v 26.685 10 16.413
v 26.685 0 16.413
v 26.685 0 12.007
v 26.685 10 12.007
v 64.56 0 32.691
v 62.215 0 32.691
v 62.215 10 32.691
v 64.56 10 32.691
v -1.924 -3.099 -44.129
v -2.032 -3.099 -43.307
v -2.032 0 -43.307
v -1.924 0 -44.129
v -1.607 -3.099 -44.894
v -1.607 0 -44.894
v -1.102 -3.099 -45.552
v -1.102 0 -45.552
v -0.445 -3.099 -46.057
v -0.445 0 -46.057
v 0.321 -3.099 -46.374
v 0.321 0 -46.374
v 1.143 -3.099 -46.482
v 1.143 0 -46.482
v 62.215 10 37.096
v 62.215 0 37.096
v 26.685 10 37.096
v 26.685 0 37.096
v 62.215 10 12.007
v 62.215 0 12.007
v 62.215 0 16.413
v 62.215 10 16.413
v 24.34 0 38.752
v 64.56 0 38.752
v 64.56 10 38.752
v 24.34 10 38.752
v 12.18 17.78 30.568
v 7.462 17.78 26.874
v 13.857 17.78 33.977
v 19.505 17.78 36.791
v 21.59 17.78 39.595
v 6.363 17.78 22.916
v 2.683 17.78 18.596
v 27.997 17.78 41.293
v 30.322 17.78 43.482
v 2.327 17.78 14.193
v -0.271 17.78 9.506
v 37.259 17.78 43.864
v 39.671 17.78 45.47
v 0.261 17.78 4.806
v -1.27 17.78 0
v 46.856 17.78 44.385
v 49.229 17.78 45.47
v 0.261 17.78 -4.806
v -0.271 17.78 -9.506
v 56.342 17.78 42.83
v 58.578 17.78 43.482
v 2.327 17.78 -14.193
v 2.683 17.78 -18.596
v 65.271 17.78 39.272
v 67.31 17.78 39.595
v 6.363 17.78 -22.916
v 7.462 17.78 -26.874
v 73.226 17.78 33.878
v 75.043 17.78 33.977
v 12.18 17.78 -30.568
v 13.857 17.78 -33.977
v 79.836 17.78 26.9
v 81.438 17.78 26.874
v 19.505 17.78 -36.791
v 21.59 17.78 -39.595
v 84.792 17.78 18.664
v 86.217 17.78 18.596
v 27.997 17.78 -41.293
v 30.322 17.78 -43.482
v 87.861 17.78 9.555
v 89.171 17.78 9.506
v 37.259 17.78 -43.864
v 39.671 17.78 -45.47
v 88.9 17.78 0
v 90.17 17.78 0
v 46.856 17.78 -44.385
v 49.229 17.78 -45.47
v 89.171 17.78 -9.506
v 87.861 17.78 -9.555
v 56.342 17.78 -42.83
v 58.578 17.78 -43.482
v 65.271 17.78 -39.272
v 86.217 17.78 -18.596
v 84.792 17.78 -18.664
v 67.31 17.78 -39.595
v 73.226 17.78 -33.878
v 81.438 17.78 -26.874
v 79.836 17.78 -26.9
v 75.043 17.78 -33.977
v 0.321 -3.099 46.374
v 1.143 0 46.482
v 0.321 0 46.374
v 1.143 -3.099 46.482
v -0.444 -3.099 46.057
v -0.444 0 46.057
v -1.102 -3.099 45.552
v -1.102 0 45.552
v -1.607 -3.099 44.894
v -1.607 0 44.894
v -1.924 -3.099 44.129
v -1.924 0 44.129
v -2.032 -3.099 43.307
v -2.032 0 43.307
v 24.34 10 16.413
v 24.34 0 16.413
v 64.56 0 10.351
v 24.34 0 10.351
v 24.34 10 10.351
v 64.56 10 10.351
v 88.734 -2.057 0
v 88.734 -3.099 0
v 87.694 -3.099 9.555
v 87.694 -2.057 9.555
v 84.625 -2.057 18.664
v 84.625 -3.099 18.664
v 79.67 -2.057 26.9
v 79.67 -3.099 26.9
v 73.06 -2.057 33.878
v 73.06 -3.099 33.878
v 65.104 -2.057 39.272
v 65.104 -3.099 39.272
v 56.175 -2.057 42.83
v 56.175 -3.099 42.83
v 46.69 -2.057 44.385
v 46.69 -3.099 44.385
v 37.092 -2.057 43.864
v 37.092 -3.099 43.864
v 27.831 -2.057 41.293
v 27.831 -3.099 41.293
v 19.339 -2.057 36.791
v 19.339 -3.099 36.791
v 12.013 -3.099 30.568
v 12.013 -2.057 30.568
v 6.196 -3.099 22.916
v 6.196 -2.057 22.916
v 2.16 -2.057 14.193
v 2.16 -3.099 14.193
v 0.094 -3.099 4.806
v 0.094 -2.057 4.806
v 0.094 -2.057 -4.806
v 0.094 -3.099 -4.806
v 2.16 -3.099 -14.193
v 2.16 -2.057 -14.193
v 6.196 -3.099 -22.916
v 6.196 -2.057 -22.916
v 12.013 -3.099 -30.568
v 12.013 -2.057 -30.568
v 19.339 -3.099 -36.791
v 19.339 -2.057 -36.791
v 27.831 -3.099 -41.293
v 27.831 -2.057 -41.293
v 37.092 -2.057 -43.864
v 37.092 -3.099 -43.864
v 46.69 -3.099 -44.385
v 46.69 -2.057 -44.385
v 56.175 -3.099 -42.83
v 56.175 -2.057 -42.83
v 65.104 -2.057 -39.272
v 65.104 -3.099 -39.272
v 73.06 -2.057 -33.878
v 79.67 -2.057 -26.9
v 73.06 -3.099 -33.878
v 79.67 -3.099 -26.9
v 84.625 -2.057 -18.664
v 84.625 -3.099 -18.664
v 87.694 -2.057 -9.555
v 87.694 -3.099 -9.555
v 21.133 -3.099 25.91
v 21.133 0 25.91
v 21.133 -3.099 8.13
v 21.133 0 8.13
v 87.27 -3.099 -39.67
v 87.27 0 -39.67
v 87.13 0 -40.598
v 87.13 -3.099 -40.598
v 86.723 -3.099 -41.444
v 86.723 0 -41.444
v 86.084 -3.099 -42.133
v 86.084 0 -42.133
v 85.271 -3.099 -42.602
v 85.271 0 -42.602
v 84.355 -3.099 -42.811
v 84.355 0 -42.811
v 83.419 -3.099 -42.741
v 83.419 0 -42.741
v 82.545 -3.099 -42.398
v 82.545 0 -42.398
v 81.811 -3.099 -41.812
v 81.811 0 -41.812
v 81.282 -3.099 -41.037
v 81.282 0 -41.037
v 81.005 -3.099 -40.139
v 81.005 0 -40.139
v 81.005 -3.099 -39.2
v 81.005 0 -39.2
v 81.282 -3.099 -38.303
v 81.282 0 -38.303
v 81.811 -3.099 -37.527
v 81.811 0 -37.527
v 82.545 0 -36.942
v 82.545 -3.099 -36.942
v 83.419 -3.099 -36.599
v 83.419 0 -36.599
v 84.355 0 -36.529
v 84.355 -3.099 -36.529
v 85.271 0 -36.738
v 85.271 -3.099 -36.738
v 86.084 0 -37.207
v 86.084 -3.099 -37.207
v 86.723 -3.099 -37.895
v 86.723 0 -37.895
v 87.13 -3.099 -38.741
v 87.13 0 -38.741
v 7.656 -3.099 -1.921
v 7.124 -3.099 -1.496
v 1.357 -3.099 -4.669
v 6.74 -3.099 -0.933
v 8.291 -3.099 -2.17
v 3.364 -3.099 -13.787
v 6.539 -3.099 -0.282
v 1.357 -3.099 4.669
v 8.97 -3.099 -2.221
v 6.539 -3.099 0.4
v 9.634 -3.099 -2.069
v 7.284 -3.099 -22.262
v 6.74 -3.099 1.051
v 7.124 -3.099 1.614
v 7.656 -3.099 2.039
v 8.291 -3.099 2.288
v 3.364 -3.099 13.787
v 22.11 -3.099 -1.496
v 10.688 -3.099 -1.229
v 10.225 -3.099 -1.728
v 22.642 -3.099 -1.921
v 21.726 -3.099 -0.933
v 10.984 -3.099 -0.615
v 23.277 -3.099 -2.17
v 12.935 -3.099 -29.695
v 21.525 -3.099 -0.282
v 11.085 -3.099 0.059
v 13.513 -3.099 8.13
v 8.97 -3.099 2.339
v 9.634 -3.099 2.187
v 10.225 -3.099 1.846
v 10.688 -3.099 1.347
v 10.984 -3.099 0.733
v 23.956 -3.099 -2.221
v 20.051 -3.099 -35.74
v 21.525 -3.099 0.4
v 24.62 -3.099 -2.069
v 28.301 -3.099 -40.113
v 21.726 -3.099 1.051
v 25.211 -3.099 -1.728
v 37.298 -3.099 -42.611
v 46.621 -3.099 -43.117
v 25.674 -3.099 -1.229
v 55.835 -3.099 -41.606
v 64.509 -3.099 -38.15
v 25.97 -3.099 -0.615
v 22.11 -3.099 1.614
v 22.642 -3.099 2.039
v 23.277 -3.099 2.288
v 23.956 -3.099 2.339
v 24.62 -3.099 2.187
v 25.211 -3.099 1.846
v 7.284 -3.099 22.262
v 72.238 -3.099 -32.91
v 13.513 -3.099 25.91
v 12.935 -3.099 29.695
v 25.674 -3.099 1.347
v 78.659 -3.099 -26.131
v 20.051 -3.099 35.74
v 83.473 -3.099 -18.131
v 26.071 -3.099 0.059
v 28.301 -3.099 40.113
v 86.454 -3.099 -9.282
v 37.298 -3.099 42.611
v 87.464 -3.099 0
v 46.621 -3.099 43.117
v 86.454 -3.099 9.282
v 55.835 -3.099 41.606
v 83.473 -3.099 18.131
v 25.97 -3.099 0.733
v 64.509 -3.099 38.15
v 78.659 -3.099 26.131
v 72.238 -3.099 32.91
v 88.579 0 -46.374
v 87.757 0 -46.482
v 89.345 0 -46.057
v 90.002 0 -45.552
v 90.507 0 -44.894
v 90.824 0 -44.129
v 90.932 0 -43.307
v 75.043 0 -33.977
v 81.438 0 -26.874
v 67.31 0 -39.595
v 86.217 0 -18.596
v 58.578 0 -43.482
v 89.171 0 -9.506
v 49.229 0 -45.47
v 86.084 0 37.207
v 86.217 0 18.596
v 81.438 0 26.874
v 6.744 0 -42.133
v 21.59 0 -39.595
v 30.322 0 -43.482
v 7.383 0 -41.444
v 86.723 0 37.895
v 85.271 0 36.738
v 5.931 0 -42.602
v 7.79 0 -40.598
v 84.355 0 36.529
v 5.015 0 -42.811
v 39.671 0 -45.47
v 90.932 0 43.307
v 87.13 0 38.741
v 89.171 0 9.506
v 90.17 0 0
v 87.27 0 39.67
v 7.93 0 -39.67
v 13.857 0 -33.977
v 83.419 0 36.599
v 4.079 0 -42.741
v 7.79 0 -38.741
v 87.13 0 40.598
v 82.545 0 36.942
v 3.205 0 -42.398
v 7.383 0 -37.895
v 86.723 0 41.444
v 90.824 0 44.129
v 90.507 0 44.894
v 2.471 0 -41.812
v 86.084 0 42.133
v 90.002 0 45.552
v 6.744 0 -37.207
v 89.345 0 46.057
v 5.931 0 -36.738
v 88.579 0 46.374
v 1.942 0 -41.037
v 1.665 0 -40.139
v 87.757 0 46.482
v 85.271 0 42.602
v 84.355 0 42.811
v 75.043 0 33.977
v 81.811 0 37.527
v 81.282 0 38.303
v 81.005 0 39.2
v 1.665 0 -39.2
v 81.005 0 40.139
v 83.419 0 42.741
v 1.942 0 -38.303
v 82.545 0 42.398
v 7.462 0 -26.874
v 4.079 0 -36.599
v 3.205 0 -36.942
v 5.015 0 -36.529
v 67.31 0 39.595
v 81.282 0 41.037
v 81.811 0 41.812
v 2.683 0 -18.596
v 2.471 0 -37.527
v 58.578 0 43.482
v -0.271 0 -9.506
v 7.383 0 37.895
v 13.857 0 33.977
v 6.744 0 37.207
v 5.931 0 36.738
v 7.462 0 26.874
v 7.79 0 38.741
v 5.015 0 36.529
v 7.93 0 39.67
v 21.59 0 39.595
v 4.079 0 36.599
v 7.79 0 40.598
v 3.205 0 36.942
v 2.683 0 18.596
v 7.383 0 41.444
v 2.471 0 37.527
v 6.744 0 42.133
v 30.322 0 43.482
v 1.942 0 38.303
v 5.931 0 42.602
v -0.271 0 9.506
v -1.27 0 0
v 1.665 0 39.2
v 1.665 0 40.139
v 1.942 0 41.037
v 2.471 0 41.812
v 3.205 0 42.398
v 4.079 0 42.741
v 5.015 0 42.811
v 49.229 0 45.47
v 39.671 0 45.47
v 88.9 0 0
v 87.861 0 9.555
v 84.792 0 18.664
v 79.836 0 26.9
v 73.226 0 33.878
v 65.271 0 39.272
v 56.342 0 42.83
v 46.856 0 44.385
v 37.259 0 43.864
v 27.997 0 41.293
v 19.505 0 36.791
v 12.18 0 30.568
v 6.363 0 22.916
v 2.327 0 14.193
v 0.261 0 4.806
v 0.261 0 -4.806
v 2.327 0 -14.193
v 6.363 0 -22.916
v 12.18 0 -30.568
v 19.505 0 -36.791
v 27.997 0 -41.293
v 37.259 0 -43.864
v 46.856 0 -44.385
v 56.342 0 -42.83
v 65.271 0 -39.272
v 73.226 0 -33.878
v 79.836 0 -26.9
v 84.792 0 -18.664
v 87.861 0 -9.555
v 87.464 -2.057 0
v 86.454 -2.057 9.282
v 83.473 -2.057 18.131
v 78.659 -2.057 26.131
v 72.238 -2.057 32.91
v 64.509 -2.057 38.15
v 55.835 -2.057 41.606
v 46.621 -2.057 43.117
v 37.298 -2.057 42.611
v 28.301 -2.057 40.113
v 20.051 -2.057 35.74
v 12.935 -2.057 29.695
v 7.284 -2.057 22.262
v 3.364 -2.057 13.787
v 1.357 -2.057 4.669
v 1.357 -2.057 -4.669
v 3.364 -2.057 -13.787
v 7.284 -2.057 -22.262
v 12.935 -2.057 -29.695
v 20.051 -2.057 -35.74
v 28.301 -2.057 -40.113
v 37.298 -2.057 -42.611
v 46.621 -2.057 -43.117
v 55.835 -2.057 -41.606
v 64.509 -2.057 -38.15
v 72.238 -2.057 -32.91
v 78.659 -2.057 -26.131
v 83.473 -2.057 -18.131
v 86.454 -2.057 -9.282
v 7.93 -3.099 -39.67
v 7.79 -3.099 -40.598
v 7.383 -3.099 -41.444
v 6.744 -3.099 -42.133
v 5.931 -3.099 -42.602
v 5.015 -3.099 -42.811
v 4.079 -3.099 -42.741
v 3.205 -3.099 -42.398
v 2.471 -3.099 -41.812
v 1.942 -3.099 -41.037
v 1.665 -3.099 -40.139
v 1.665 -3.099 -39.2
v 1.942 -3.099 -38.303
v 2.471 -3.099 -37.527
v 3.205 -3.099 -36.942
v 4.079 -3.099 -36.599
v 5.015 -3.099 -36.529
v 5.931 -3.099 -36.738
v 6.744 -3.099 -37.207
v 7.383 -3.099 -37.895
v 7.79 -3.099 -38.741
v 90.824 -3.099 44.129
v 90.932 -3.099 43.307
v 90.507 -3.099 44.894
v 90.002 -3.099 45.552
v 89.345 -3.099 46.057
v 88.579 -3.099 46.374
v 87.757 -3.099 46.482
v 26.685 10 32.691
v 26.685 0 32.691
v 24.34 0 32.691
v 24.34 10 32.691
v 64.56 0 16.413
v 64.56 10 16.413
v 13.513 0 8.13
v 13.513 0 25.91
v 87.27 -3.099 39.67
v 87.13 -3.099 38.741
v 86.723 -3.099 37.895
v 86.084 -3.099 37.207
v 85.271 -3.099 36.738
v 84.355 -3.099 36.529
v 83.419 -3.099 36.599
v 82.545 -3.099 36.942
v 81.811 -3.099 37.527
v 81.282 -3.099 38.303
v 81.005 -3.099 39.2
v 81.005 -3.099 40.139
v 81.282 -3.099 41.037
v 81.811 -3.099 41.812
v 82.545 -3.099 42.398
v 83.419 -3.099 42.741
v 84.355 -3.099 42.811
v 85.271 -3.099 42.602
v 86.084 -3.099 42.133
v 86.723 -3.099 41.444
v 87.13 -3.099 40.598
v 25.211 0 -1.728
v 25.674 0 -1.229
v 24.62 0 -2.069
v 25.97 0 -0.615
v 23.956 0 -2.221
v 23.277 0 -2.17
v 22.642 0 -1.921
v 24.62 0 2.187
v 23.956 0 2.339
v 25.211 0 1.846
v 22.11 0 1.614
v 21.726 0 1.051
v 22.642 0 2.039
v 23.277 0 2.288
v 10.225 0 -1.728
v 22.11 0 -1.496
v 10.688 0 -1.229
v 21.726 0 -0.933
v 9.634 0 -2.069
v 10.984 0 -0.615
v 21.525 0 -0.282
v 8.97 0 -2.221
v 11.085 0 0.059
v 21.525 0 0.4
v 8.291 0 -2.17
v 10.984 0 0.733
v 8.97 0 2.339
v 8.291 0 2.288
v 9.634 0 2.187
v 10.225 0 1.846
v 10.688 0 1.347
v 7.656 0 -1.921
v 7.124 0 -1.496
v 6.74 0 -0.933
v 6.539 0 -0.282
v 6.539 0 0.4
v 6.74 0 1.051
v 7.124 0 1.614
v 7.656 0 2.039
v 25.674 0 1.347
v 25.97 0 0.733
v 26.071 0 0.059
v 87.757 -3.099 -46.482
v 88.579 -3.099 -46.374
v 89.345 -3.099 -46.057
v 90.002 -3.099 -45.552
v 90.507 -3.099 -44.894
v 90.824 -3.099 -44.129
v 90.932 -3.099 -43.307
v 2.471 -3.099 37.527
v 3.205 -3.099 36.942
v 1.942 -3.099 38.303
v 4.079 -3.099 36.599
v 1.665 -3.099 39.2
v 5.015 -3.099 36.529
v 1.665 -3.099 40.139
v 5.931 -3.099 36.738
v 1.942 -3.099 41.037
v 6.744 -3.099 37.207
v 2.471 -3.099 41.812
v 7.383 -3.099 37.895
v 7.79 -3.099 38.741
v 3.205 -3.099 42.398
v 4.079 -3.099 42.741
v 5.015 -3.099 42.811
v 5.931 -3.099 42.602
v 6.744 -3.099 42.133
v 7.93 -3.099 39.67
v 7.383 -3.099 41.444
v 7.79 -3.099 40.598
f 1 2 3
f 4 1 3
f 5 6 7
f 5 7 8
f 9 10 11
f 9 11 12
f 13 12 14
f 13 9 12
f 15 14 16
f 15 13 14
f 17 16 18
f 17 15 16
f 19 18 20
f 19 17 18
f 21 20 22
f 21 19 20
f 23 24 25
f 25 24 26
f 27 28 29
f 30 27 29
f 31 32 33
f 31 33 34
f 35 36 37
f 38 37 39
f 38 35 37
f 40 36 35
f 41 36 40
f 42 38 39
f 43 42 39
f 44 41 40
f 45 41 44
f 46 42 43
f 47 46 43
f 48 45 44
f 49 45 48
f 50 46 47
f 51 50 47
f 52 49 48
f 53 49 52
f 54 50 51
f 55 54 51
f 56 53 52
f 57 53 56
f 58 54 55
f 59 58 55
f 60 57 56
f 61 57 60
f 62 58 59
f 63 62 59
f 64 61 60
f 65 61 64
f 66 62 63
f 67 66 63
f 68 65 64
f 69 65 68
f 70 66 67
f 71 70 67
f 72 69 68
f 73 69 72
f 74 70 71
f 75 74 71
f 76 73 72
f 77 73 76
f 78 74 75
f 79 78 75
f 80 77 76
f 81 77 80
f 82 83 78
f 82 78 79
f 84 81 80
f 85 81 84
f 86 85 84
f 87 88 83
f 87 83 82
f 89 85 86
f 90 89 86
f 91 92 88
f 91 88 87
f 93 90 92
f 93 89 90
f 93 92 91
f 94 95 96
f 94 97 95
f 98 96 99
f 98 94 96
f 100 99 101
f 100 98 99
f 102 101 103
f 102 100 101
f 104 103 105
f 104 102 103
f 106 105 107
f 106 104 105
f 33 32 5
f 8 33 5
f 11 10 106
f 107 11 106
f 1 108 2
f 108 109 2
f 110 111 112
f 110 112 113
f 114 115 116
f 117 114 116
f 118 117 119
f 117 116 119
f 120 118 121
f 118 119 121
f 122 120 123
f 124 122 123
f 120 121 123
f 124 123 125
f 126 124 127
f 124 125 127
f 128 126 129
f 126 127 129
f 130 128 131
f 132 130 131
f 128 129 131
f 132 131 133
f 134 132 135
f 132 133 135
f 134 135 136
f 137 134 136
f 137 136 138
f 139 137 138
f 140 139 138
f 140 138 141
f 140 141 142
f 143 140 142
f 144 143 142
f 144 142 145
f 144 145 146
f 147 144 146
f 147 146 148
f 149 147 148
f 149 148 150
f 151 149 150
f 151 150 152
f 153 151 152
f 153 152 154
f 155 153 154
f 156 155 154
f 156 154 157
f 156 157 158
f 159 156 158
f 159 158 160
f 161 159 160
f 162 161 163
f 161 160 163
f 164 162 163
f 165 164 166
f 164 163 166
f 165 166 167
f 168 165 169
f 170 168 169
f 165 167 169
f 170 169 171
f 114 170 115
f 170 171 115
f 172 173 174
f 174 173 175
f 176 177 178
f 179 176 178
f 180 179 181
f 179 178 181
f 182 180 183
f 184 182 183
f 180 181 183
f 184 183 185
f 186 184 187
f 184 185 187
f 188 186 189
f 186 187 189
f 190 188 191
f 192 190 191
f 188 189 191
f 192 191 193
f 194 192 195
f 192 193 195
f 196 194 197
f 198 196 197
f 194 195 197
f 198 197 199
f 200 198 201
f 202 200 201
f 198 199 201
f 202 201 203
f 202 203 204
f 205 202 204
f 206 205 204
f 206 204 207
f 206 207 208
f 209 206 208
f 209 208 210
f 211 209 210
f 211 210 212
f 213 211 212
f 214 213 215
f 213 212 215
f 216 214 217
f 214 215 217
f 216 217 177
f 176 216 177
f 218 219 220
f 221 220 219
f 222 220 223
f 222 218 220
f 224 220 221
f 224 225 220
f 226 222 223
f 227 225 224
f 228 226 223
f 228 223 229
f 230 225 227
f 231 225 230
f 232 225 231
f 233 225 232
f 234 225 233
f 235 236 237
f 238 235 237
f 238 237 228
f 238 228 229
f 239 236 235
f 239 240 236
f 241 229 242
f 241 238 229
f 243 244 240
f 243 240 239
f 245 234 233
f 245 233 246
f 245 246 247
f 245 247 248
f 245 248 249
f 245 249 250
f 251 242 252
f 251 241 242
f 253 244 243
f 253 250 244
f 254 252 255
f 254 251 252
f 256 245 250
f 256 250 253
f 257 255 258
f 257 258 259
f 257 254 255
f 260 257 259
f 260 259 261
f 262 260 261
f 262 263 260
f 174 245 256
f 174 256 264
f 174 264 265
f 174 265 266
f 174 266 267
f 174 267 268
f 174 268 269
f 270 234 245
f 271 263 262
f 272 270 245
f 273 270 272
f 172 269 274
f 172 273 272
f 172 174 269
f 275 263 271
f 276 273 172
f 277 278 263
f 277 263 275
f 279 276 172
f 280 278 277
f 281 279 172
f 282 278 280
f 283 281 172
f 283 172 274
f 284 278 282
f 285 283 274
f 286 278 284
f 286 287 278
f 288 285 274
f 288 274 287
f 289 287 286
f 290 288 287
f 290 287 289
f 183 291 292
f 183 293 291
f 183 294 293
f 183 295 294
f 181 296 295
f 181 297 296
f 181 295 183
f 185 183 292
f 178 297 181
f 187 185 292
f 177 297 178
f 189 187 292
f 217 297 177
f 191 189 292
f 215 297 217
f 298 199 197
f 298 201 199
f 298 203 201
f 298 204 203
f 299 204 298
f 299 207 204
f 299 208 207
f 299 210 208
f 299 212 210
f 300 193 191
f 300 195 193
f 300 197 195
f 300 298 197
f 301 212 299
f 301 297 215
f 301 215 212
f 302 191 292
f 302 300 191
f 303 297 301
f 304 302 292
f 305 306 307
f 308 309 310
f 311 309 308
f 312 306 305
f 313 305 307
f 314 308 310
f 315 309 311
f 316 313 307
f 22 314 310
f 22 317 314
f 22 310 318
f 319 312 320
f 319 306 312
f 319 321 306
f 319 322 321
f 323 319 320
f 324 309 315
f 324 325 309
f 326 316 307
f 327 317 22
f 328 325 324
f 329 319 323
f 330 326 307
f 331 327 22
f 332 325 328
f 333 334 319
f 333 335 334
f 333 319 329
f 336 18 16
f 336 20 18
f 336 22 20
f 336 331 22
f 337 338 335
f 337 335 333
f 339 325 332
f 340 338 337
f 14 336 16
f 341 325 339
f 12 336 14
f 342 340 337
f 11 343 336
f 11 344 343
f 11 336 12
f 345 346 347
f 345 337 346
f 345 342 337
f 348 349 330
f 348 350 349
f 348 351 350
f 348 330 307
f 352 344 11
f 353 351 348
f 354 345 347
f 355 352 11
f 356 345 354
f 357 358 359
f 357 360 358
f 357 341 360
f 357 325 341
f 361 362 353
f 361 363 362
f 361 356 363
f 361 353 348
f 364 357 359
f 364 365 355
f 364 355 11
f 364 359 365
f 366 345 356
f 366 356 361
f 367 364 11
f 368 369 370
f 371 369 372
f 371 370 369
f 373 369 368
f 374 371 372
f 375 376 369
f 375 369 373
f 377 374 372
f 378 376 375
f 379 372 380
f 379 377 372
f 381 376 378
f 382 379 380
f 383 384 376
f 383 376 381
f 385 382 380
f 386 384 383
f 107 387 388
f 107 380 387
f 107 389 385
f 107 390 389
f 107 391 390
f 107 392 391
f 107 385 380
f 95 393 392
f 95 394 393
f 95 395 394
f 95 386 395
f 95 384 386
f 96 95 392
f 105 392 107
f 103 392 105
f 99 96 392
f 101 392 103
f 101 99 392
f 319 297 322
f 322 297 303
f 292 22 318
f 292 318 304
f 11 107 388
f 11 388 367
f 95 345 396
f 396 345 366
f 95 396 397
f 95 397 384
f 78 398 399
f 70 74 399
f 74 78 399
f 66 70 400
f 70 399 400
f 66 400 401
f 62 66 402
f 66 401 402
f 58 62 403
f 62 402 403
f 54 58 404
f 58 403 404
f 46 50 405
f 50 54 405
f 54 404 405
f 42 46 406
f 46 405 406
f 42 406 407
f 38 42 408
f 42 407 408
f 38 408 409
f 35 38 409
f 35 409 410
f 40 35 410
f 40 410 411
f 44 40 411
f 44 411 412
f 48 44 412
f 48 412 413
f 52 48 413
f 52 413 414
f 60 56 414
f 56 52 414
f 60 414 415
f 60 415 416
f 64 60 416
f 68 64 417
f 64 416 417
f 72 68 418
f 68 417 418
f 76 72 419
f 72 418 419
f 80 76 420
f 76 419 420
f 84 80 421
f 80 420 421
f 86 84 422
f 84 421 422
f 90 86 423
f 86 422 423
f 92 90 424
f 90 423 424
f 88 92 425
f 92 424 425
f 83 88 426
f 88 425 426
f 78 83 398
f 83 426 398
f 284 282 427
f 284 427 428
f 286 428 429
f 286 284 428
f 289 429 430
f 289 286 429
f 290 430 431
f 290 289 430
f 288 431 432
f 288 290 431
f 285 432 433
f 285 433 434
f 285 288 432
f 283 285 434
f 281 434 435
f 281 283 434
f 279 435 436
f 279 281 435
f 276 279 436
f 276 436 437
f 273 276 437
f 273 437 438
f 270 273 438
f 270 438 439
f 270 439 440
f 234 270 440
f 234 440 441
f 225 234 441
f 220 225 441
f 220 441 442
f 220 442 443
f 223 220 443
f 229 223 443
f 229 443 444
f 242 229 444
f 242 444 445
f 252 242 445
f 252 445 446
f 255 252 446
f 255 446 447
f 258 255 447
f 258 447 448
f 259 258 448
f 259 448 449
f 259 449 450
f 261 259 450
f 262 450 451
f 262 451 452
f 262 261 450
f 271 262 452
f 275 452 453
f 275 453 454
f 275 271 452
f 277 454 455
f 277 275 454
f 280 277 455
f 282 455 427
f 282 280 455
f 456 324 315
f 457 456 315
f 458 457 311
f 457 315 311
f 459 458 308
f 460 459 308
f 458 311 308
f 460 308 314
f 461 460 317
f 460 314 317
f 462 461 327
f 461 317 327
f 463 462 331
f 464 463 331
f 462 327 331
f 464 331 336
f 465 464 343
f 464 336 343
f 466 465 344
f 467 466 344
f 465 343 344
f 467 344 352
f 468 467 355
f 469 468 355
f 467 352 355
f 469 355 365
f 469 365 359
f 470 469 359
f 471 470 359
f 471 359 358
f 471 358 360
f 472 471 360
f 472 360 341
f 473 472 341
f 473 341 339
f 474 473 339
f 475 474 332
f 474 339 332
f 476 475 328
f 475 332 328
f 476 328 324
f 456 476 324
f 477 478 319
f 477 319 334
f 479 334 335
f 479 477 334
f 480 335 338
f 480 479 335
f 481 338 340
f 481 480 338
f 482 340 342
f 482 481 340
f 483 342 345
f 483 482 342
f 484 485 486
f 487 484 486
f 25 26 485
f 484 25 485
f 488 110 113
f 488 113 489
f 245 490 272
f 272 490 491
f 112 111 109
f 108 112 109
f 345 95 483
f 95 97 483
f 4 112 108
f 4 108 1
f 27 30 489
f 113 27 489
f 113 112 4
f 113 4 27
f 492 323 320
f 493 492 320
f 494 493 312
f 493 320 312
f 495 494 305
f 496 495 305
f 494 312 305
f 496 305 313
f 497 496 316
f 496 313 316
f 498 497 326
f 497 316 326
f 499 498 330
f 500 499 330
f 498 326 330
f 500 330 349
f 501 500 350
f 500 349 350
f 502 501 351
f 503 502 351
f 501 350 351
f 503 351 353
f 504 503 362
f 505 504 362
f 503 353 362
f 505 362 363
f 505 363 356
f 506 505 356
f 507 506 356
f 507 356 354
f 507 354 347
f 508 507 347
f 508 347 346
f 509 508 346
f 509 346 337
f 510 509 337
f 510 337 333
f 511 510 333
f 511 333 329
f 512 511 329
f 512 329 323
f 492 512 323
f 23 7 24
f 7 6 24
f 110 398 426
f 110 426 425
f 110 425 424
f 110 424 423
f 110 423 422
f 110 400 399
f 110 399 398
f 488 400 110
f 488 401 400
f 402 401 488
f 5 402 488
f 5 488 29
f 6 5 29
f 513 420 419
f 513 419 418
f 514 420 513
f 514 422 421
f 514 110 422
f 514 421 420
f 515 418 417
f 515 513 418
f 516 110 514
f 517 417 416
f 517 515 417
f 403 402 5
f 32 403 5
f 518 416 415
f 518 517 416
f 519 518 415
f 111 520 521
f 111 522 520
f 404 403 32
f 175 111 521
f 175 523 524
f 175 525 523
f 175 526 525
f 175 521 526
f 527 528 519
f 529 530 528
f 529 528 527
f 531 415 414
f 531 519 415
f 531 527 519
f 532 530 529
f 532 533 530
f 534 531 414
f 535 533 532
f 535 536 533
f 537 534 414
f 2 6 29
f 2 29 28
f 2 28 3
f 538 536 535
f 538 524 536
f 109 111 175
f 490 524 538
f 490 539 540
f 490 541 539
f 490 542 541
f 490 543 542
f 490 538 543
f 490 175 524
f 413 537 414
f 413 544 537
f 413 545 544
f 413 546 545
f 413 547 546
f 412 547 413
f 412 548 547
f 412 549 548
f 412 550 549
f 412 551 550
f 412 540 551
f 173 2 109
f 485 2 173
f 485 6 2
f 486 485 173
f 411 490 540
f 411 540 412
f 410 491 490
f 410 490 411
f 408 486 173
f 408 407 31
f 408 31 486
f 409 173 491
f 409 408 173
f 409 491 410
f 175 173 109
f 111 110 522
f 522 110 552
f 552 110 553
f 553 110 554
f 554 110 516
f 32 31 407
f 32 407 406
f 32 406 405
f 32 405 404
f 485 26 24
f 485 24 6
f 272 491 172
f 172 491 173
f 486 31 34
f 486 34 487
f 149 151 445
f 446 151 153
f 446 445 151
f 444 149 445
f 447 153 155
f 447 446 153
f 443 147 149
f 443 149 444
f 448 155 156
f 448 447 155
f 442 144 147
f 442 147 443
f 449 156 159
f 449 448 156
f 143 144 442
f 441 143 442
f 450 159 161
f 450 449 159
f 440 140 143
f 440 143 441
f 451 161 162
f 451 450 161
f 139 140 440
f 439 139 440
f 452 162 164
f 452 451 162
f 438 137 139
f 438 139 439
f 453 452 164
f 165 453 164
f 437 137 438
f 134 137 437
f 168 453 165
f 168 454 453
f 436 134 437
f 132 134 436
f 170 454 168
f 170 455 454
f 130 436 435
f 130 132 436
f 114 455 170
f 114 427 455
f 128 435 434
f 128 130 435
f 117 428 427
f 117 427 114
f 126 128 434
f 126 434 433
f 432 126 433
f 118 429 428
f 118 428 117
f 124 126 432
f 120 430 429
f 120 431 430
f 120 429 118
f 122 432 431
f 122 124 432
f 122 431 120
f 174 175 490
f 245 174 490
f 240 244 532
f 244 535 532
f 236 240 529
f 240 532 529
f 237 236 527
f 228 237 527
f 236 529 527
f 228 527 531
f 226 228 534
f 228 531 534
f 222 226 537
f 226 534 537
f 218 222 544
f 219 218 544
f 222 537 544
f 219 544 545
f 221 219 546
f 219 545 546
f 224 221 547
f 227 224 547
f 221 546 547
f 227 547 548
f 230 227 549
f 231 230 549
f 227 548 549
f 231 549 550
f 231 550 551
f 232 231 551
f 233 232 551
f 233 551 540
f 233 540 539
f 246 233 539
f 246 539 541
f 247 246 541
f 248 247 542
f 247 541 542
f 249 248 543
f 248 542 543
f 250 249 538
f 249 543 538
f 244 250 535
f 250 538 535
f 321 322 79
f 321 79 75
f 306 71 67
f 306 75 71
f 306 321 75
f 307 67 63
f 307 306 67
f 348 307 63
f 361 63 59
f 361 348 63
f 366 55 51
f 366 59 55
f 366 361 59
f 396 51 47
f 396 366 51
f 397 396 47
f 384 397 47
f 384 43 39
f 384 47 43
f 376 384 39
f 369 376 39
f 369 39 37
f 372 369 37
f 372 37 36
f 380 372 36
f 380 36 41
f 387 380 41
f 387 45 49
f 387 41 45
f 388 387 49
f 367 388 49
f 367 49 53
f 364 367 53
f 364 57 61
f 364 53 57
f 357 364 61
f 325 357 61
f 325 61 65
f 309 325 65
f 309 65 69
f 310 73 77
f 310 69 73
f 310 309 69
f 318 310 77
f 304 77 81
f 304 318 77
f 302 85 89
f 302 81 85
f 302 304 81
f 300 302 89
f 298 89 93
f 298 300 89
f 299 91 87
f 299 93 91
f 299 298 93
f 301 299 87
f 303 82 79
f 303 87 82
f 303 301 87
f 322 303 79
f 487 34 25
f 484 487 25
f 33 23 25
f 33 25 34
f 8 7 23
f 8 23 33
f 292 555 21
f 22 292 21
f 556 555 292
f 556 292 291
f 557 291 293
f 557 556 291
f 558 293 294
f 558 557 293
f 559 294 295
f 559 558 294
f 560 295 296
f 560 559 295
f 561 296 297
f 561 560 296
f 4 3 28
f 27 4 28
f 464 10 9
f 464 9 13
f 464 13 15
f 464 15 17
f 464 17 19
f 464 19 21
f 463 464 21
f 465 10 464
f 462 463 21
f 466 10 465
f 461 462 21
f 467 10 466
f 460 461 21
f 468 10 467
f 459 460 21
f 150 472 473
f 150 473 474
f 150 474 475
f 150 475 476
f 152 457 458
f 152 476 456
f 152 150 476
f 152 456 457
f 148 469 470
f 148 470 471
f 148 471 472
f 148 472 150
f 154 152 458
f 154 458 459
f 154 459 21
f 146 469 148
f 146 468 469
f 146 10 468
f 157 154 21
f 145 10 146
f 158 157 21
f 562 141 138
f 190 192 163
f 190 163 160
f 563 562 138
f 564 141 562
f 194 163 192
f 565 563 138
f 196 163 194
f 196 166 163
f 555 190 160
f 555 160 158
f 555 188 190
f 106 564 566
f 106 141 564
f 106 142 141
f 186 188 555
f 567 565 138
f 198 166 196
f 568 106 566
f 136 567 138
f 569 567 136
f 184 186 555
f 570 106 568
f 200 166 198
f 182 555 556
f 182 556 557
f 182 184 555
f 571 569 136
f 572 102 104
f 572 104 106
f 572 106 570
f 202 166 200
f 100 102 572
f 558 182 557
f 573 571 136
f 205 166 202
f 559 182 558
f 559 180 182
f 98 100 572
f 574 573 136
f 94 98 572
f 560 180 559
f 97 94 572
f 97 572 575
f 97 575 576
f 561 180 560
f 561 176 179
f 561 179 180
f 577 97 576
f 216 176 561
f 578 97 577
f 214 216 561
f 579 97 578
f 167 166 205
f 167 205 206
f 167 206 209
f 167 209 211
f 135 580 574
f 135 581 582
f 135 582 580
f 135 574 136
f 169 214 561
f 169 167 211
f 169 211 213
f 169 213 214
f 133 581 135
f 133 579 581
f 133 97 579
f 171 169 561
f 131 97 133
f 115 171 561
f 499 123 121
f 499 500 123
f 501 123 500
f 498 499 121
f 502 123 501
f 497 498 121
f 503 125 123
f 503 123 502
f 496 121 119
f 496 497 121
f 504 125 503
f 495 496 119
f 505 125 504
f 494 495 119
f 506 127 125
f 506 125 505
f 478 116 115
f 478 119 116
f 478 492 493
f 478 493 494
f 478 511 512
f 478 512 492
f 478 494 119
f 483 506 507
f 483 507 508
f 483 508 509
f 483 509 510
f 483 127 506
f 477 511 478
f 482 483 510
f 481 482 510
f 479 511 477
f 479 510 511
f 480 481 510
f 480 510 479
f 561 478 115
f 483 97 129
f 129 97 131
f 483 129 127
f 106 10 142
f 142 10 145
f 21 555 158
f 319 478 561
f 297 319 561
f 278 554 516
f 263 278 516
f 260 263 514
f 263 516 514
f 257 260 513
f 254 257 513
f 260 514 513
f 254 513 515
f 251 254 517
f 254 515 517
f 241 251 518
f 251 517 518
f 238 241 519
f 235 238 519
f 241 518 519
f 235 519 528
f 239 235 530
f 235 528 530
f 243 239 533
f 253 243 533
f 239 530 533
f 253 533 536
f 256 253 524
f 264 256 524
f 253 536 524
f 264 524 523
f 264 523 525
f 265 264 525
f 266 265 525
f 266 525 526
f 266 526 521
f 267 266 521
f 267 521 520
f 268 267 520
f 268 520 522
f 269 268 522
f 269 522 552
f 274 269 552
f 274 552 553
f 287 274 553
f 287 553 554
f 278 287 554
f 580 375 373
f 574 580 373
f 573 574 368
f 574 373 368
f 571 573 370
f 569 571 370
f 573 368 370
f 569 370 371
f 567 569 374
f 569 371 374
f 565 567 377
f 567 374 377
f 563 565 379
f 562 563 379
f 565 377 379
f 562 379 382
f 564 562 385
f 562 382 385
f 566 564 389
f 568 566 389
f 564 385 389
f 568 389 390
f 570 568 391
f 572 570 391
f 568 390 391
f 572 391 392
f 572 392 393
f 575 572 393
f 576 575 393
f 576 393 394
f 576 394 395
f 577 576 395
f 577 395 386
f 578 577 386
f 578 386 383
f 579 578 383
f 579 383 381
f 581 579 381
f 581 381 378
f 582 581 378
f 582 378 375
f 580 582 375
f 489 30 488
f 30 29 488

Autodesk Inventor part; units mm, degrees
ref_plane "YZ Plane" through (0, 0, 0) normal (1, 0, 0) x (0, 1, 0)
ref_plane "XZ Plane" through (0, 0, 0) normal (0, 1, 0) x (-1, 0, 0)
ref_plane "XY Plane" through (0, 0, 0) normal (0, 0, 1) x (1, 0, 0)
sketch "Bottom" plane through (0, 0, 0) normal (0, 0, 1) x (1, 0, 0)
  line L0 (0, 0) -> (88.9, 0)
  line L1 (88.9, 0) -> (88.9, -3.0988)
  line L2 (88.9, -3.0988) -> (0, -3.0988)
  line L3 (0, -3.0988) -> (0, 0)
  line L4 (44.45, -3.0988) -> (44.45, 0)
  line L5 (44.45, 0) -> (90.932, 0)
  line L6 (44.45, 0) -> (90.932, 0)
  line L7 (90.932, 0) -> (90.932, -3.0988)
  line L8 (90.932, -3.0988) -> (44.45, -3.0988)
  line L9 (44.45, -3.0988) -> (44.45, 0)
  line L10 (44.45, 0) -> (-2.032, 0)
  line L11 (-2.032, 0) -> (-2.032, -3.0988)
  line L12 (-2.032, -3.0988) -> (44.45, -3.0988)
  line L13 (44.45, -3.0988) -> (44.45, 0)
  dimension "d0" = 88.9
  dimension "d1" = 3.0988
  dimension "d3" = 46.482
  dimension "d4" = 46.482
revolve "Bottom Base" add sketch "Bottom" angle 360 about axis through (44.45, -3.0988, 0) along (0, 1, 0)
sketch "Outer Wall Circles" plane through (44.45, 0, 0) normal (0, 1, 0) x (1, 0, 0)
  circle A0 centre (0, 0) radius 44.45
  circle A1 centre (0, 0) radius 45.72
  point P0 (-44.45, 0)
  dimension "d6" = 88.9
  dimension "d77" = 91.44
extrude "Outer Wall Extr" add sketch "Outer Wall Circles" along normal blind 17.78
sketch "Mount Square" plane through (44.45, -3.0988, 0) normal (0, -1, 0) x (1, 0, 0)
  circle A0 centre (0, 0) radius 46.482
  line L0 (43.307, -46.482) -> (-43.307, -46.482)
  line L1 (-46.482, -43.307) -> (-46.482, 43.307)
  line L2 (-43.307, 46.482) -> (43.307, 46.482)
  line L3 (46.482, 43.307) -> (46.482, -43.307)
  line L4 (46.482, -46.482) -> (-46.482, 46.482) construction
  line L5 (-46.482, -46.482) -> (46.482, 46.482) construction
  arc A1 (-46.482, -43.307) -> (-43.307, -46.482) centre (-43.307, -43.307) ccw
  arc A2 (43.307, -46.482) -> (46.482, -43.307) centre (43.307, -43.307) ccw
  arc A3 (46.482, 43.307) -> (43.307, 46.482) centre (43.307, 43.307) ccw
  arc A4 (-43.307, 46.482) -> (-46.482, 43.307) centre (-43.307, 43.307) ccw
  point P0 (-44.45, 0)
  dimension "d30" = 3.175
extrude "Base Mount" add sketch "Mount Square" against normal blind 3.0988 contours L3 A2 L0 A0 | A0 L2 A3 L3 | A0 L1 A4 L2 | L0 A1 L1 A0
sketch "Silicon Circles" plane through (1.143, -3.0988, 46.482) normal (0, -1, 0) x (1, 0, 0)
  line L0 (89.789, -3.175) -> (89.789, -89.789) projected
  circle A0 centre (43.1405, -46.482) radius 44.45
  circle A1 centre (43.1405, -46.482) radius 43.18
  point P0 (-1.143, -46.482)
  dimension "d37" = 88.9
  dimension "d38" = 86.36
extrude "Silicon Hole" cut sketch "Silicon Circles" against normal blind 1.0414
sketch "HX711-MCU Design" plane through (44.45, 0, 0) normal (0, 1, 0) x (1, 0, 0)
  line L0 (0, 0) -> (-44.45, 0) construction
  line L1 (-23.3172, -8.1296) -> (-30.9372, -8.1296)
  line L2 (-30.9372, -8.1296) -> (-30.9372, -25.9096)
  line L3 (-30.9372, -25.9096) -> (-23.3172, -25.9096)
  line L4 (-23.3172, -25.9096) -> (-23.3172, -8.1296)
  dimension "d57" = 7.62
  dimension "d58" = 17.78
extrude "HX711 - MCU Hole" cut sketch "HX711-MCU Design" against normal blind 3.1242
sketch "hx711 mount" plane through (44.45, 0, 0) normal (0, 1, 0) x (1, 0, 0)
  line L0 (20.11, -38.7522) -> (-20.11, -38.7522)
  line L1 (-20.11, -38.7522) -> (-20.11, -32.6906)
  line L2 (-20.11, -10.3514) -> (20.11, -10.3514)
  line L3 (20.11, -10.3514) -> (20.11, -16.413)
  line L4 (17.765, -37.0963) -> (-17.765, -12.0073) construction
  line L5 (-17.765, -37.0963) -> (17.765, -12.0073) construction
  line L6 (17.765, -37.0963) -> (-17.765, -37.0963)
  line L7 (-17.765, -37.0963) -> (-17.765, -32.6906)
  line L8 (-17.765, -12.0073) -> (17.765, -12.0073)
  line L9 (17.765, -12.0073) -> (17.765, -16.413)
  line L10 (17.765, -37.0963) -> (-17.765, -12.0073) construction
  line L11 (-17.765, -37.0963) -> (-11.5259, -32.6906) construction
  line L12 (0, -24.5518) -> (17.765, -24.5518) construction
  line L13 (-17.765, -32.6906) -> (-20.11, -32.6906)
  line L14 (-11.5259, -32.6906) -> (17.765, -12.0073) construction
  line L15 (-20.11, -16.413) -> (-17.765, -16.413)
  line L16 (17.765, -32.6906) -> (20.11, -32.6906)
  line L17 (17.765, -16.413) -> (20.11, -16.413)
  line L18 (-17.765, -12.0073) -> (17.765, -12.0073)
  line L19 (17.765, -12.0073) -> (17.765, -16.413)
  line L20 (17.765, -37.0963) -> (-17.765, -37.0963)
  line L21 (-17.765, -37.0963) -> (-17.765, -32.6906)
  line L22 (-20.11, -38.7522) -> (20.11, -38.7522)
  line L23 (20.11, -38.7522) -> (20.11, -32.6906)
  line L24 (20.11, -10.3514) -> (-20.11, -10.3514)
  line L25 (-20.11, -10.3514) -> (-20.11, -16.413)
  line L26 (-17.765, -16.413) -> (-17.765, -12.0073)
  line L27 (-20.11, -16.413) -> (-20.11, -10.3514)
  line L28 (17.765, -32.6906) -> (17.765, -37.0963)
  line L29 (17.765, -32.6906) -> (17.765, -37.0963)
  line L30 (20.11, -32.6906) -> (20.11, -38.7522)
  line L31 (20.11, -16.413) -> (20.11, -10.3514)
  line L32 (-20.11, -32.6906) -> (-20.11, -38.7522)
  line L33 (-17.765, -16.413) -> (-17.765, -12.0073)
  point P0 (-44.45, 0)
  point P1 (-17.765, -32.6906)
sketch "Bottom Circles" plane through (44.45, 0, 0) normal (0, 1, 0) x (1, 0, 0)
  line L0 (-16.2451, -6.4091) -> (-16.2451, 6.2909) construction
  line L1 (-22.9507, -0.0591) -> (-16.2451, -0.0591) construction
  line L2 (-22.9507, -0.0591) -> (-18.3787, -0.0591) construction
  circle A0 centre (-20.6647, -0.0591) radius 2.286
  line L3 (-33.3647, -0.0591) -> (-22.9507, -0.0591) construction
  line L4 (-33.3647, -0.0591) -> (-40.0703, -0.0591) construction
  line L5 (-40.0703, 6.2909) -> (-40.0703, -6.4091) construction
  line L6 (-16.2451, -6.4091) -> (-40.0703, -6.4091) construction
  line L7 (-40.0703, -6.4091) -> (-40.0703, 6.2909) construction
  line L8 (-40.0703, 6.2909) -> (-16.2451, 6.2909) construction
  line L9 (-16.2451, 6.2909) -> (-16.2451, -6.4091) construction
  line L10 (-28.1577, -0.0591) -> (-28.1577, -6.4091) construction
  line L11 (-40.0703, -6.4091) -> (-16.2451, -6.4091) construction
  circle A1 centre (-35.6507, -0.0591) radius 2.286
  line L12 (0, 0) -> (0, 6.2909) construction
  line L13 (0, 0) -> (-45.3601, 45.3601) construction
  line L14 (0, 0) -> (64.1489, 0) construction
  circle A2 centre (-39.6699, 39.6699) radius 3.15
  circle A3 centre (39.6699, 39.6699) radius 3.15
  line L15 (0, 0) -> (6.017, 0) construction
  circle A4 centre (-39.6699, -39.6699) radius 3.15
  circle A5 centre (39.6699, -39.6699) radius 3.15
  point P0 (-44.45, 0)
  dimension "d103" = 4.572
  dimension "d104" = 10.414
  dimension "d105" = 2.1336
  dimension "d106" = 2.1336
  dimension "d113" = 135
  dimension "d114" = 6.3
extrude "Bottom Holes" cut sketch "Bottom Circles" against normal blind 4 contours A0 | A1
sketch "Top Shadow" plane through (44.45, 0, 0) normal (0, 1, 0) x (1, 0, 0)
  line L0 (27.4022, -6.3354) -> (27.4022, 6.3646) construction
  circle A0 centre (34.8952, 0.0146) radius 2.794 construction
  circle A1 centre (19.9092, 0.0146) radius 2.794 construction
  line L1 (22.7032, 0.0146) -> (32.1012, 0.0146) construction
  line L2 (14.7022, -6.3354) -> (40.1022, -6.3354) construction
  line L3 (40.1022, -6.3354) -> (40.1022, 6.3646) construction
  line L4 (40.1022, 6.3646) -> (14.7022, 6.3646) construction
  line L5 (14.7022, 6.3646) -> (14.7022, -6.3354) construction
  line L6 (14.7022, -6.3354) -> (40.1022, 6.3646) construction
  line L7 (40.1022, -6.3354) -> (14.7022, 6.3646) construction
  line L8 (40.065, -6.3646) -> (-40.065, -6.3646) construction
  line L9 (-40.065, -6.3646) -> (-40.065, 6.3646) construction
  line L10 (-40.065, 6.3646) -> (40.065, 6.3646) construction
  line L11 (40.065, 6.3646) -> (40.065, -6.3646) construction
  line L12 (40.065, -6.3646) -> (-40.065, 6.3646) construction
  line L13 (-40.065, -6.3646) -> (40.065, 6.3646) construction
  point P0 (27.4022, 0.0146)
  point P1 (0, 0)
  dimension "d109" = 9.398
extrude "Base to Rail Mount" cut sketch "Bottom Circles" against normal blind 4 contours A2 | A3 | A4 | A5
extrude "hx711 walls" add sketch "hx711 mount" along normal blind 10
properties part number "Bottom Sensor Base v1.3"
